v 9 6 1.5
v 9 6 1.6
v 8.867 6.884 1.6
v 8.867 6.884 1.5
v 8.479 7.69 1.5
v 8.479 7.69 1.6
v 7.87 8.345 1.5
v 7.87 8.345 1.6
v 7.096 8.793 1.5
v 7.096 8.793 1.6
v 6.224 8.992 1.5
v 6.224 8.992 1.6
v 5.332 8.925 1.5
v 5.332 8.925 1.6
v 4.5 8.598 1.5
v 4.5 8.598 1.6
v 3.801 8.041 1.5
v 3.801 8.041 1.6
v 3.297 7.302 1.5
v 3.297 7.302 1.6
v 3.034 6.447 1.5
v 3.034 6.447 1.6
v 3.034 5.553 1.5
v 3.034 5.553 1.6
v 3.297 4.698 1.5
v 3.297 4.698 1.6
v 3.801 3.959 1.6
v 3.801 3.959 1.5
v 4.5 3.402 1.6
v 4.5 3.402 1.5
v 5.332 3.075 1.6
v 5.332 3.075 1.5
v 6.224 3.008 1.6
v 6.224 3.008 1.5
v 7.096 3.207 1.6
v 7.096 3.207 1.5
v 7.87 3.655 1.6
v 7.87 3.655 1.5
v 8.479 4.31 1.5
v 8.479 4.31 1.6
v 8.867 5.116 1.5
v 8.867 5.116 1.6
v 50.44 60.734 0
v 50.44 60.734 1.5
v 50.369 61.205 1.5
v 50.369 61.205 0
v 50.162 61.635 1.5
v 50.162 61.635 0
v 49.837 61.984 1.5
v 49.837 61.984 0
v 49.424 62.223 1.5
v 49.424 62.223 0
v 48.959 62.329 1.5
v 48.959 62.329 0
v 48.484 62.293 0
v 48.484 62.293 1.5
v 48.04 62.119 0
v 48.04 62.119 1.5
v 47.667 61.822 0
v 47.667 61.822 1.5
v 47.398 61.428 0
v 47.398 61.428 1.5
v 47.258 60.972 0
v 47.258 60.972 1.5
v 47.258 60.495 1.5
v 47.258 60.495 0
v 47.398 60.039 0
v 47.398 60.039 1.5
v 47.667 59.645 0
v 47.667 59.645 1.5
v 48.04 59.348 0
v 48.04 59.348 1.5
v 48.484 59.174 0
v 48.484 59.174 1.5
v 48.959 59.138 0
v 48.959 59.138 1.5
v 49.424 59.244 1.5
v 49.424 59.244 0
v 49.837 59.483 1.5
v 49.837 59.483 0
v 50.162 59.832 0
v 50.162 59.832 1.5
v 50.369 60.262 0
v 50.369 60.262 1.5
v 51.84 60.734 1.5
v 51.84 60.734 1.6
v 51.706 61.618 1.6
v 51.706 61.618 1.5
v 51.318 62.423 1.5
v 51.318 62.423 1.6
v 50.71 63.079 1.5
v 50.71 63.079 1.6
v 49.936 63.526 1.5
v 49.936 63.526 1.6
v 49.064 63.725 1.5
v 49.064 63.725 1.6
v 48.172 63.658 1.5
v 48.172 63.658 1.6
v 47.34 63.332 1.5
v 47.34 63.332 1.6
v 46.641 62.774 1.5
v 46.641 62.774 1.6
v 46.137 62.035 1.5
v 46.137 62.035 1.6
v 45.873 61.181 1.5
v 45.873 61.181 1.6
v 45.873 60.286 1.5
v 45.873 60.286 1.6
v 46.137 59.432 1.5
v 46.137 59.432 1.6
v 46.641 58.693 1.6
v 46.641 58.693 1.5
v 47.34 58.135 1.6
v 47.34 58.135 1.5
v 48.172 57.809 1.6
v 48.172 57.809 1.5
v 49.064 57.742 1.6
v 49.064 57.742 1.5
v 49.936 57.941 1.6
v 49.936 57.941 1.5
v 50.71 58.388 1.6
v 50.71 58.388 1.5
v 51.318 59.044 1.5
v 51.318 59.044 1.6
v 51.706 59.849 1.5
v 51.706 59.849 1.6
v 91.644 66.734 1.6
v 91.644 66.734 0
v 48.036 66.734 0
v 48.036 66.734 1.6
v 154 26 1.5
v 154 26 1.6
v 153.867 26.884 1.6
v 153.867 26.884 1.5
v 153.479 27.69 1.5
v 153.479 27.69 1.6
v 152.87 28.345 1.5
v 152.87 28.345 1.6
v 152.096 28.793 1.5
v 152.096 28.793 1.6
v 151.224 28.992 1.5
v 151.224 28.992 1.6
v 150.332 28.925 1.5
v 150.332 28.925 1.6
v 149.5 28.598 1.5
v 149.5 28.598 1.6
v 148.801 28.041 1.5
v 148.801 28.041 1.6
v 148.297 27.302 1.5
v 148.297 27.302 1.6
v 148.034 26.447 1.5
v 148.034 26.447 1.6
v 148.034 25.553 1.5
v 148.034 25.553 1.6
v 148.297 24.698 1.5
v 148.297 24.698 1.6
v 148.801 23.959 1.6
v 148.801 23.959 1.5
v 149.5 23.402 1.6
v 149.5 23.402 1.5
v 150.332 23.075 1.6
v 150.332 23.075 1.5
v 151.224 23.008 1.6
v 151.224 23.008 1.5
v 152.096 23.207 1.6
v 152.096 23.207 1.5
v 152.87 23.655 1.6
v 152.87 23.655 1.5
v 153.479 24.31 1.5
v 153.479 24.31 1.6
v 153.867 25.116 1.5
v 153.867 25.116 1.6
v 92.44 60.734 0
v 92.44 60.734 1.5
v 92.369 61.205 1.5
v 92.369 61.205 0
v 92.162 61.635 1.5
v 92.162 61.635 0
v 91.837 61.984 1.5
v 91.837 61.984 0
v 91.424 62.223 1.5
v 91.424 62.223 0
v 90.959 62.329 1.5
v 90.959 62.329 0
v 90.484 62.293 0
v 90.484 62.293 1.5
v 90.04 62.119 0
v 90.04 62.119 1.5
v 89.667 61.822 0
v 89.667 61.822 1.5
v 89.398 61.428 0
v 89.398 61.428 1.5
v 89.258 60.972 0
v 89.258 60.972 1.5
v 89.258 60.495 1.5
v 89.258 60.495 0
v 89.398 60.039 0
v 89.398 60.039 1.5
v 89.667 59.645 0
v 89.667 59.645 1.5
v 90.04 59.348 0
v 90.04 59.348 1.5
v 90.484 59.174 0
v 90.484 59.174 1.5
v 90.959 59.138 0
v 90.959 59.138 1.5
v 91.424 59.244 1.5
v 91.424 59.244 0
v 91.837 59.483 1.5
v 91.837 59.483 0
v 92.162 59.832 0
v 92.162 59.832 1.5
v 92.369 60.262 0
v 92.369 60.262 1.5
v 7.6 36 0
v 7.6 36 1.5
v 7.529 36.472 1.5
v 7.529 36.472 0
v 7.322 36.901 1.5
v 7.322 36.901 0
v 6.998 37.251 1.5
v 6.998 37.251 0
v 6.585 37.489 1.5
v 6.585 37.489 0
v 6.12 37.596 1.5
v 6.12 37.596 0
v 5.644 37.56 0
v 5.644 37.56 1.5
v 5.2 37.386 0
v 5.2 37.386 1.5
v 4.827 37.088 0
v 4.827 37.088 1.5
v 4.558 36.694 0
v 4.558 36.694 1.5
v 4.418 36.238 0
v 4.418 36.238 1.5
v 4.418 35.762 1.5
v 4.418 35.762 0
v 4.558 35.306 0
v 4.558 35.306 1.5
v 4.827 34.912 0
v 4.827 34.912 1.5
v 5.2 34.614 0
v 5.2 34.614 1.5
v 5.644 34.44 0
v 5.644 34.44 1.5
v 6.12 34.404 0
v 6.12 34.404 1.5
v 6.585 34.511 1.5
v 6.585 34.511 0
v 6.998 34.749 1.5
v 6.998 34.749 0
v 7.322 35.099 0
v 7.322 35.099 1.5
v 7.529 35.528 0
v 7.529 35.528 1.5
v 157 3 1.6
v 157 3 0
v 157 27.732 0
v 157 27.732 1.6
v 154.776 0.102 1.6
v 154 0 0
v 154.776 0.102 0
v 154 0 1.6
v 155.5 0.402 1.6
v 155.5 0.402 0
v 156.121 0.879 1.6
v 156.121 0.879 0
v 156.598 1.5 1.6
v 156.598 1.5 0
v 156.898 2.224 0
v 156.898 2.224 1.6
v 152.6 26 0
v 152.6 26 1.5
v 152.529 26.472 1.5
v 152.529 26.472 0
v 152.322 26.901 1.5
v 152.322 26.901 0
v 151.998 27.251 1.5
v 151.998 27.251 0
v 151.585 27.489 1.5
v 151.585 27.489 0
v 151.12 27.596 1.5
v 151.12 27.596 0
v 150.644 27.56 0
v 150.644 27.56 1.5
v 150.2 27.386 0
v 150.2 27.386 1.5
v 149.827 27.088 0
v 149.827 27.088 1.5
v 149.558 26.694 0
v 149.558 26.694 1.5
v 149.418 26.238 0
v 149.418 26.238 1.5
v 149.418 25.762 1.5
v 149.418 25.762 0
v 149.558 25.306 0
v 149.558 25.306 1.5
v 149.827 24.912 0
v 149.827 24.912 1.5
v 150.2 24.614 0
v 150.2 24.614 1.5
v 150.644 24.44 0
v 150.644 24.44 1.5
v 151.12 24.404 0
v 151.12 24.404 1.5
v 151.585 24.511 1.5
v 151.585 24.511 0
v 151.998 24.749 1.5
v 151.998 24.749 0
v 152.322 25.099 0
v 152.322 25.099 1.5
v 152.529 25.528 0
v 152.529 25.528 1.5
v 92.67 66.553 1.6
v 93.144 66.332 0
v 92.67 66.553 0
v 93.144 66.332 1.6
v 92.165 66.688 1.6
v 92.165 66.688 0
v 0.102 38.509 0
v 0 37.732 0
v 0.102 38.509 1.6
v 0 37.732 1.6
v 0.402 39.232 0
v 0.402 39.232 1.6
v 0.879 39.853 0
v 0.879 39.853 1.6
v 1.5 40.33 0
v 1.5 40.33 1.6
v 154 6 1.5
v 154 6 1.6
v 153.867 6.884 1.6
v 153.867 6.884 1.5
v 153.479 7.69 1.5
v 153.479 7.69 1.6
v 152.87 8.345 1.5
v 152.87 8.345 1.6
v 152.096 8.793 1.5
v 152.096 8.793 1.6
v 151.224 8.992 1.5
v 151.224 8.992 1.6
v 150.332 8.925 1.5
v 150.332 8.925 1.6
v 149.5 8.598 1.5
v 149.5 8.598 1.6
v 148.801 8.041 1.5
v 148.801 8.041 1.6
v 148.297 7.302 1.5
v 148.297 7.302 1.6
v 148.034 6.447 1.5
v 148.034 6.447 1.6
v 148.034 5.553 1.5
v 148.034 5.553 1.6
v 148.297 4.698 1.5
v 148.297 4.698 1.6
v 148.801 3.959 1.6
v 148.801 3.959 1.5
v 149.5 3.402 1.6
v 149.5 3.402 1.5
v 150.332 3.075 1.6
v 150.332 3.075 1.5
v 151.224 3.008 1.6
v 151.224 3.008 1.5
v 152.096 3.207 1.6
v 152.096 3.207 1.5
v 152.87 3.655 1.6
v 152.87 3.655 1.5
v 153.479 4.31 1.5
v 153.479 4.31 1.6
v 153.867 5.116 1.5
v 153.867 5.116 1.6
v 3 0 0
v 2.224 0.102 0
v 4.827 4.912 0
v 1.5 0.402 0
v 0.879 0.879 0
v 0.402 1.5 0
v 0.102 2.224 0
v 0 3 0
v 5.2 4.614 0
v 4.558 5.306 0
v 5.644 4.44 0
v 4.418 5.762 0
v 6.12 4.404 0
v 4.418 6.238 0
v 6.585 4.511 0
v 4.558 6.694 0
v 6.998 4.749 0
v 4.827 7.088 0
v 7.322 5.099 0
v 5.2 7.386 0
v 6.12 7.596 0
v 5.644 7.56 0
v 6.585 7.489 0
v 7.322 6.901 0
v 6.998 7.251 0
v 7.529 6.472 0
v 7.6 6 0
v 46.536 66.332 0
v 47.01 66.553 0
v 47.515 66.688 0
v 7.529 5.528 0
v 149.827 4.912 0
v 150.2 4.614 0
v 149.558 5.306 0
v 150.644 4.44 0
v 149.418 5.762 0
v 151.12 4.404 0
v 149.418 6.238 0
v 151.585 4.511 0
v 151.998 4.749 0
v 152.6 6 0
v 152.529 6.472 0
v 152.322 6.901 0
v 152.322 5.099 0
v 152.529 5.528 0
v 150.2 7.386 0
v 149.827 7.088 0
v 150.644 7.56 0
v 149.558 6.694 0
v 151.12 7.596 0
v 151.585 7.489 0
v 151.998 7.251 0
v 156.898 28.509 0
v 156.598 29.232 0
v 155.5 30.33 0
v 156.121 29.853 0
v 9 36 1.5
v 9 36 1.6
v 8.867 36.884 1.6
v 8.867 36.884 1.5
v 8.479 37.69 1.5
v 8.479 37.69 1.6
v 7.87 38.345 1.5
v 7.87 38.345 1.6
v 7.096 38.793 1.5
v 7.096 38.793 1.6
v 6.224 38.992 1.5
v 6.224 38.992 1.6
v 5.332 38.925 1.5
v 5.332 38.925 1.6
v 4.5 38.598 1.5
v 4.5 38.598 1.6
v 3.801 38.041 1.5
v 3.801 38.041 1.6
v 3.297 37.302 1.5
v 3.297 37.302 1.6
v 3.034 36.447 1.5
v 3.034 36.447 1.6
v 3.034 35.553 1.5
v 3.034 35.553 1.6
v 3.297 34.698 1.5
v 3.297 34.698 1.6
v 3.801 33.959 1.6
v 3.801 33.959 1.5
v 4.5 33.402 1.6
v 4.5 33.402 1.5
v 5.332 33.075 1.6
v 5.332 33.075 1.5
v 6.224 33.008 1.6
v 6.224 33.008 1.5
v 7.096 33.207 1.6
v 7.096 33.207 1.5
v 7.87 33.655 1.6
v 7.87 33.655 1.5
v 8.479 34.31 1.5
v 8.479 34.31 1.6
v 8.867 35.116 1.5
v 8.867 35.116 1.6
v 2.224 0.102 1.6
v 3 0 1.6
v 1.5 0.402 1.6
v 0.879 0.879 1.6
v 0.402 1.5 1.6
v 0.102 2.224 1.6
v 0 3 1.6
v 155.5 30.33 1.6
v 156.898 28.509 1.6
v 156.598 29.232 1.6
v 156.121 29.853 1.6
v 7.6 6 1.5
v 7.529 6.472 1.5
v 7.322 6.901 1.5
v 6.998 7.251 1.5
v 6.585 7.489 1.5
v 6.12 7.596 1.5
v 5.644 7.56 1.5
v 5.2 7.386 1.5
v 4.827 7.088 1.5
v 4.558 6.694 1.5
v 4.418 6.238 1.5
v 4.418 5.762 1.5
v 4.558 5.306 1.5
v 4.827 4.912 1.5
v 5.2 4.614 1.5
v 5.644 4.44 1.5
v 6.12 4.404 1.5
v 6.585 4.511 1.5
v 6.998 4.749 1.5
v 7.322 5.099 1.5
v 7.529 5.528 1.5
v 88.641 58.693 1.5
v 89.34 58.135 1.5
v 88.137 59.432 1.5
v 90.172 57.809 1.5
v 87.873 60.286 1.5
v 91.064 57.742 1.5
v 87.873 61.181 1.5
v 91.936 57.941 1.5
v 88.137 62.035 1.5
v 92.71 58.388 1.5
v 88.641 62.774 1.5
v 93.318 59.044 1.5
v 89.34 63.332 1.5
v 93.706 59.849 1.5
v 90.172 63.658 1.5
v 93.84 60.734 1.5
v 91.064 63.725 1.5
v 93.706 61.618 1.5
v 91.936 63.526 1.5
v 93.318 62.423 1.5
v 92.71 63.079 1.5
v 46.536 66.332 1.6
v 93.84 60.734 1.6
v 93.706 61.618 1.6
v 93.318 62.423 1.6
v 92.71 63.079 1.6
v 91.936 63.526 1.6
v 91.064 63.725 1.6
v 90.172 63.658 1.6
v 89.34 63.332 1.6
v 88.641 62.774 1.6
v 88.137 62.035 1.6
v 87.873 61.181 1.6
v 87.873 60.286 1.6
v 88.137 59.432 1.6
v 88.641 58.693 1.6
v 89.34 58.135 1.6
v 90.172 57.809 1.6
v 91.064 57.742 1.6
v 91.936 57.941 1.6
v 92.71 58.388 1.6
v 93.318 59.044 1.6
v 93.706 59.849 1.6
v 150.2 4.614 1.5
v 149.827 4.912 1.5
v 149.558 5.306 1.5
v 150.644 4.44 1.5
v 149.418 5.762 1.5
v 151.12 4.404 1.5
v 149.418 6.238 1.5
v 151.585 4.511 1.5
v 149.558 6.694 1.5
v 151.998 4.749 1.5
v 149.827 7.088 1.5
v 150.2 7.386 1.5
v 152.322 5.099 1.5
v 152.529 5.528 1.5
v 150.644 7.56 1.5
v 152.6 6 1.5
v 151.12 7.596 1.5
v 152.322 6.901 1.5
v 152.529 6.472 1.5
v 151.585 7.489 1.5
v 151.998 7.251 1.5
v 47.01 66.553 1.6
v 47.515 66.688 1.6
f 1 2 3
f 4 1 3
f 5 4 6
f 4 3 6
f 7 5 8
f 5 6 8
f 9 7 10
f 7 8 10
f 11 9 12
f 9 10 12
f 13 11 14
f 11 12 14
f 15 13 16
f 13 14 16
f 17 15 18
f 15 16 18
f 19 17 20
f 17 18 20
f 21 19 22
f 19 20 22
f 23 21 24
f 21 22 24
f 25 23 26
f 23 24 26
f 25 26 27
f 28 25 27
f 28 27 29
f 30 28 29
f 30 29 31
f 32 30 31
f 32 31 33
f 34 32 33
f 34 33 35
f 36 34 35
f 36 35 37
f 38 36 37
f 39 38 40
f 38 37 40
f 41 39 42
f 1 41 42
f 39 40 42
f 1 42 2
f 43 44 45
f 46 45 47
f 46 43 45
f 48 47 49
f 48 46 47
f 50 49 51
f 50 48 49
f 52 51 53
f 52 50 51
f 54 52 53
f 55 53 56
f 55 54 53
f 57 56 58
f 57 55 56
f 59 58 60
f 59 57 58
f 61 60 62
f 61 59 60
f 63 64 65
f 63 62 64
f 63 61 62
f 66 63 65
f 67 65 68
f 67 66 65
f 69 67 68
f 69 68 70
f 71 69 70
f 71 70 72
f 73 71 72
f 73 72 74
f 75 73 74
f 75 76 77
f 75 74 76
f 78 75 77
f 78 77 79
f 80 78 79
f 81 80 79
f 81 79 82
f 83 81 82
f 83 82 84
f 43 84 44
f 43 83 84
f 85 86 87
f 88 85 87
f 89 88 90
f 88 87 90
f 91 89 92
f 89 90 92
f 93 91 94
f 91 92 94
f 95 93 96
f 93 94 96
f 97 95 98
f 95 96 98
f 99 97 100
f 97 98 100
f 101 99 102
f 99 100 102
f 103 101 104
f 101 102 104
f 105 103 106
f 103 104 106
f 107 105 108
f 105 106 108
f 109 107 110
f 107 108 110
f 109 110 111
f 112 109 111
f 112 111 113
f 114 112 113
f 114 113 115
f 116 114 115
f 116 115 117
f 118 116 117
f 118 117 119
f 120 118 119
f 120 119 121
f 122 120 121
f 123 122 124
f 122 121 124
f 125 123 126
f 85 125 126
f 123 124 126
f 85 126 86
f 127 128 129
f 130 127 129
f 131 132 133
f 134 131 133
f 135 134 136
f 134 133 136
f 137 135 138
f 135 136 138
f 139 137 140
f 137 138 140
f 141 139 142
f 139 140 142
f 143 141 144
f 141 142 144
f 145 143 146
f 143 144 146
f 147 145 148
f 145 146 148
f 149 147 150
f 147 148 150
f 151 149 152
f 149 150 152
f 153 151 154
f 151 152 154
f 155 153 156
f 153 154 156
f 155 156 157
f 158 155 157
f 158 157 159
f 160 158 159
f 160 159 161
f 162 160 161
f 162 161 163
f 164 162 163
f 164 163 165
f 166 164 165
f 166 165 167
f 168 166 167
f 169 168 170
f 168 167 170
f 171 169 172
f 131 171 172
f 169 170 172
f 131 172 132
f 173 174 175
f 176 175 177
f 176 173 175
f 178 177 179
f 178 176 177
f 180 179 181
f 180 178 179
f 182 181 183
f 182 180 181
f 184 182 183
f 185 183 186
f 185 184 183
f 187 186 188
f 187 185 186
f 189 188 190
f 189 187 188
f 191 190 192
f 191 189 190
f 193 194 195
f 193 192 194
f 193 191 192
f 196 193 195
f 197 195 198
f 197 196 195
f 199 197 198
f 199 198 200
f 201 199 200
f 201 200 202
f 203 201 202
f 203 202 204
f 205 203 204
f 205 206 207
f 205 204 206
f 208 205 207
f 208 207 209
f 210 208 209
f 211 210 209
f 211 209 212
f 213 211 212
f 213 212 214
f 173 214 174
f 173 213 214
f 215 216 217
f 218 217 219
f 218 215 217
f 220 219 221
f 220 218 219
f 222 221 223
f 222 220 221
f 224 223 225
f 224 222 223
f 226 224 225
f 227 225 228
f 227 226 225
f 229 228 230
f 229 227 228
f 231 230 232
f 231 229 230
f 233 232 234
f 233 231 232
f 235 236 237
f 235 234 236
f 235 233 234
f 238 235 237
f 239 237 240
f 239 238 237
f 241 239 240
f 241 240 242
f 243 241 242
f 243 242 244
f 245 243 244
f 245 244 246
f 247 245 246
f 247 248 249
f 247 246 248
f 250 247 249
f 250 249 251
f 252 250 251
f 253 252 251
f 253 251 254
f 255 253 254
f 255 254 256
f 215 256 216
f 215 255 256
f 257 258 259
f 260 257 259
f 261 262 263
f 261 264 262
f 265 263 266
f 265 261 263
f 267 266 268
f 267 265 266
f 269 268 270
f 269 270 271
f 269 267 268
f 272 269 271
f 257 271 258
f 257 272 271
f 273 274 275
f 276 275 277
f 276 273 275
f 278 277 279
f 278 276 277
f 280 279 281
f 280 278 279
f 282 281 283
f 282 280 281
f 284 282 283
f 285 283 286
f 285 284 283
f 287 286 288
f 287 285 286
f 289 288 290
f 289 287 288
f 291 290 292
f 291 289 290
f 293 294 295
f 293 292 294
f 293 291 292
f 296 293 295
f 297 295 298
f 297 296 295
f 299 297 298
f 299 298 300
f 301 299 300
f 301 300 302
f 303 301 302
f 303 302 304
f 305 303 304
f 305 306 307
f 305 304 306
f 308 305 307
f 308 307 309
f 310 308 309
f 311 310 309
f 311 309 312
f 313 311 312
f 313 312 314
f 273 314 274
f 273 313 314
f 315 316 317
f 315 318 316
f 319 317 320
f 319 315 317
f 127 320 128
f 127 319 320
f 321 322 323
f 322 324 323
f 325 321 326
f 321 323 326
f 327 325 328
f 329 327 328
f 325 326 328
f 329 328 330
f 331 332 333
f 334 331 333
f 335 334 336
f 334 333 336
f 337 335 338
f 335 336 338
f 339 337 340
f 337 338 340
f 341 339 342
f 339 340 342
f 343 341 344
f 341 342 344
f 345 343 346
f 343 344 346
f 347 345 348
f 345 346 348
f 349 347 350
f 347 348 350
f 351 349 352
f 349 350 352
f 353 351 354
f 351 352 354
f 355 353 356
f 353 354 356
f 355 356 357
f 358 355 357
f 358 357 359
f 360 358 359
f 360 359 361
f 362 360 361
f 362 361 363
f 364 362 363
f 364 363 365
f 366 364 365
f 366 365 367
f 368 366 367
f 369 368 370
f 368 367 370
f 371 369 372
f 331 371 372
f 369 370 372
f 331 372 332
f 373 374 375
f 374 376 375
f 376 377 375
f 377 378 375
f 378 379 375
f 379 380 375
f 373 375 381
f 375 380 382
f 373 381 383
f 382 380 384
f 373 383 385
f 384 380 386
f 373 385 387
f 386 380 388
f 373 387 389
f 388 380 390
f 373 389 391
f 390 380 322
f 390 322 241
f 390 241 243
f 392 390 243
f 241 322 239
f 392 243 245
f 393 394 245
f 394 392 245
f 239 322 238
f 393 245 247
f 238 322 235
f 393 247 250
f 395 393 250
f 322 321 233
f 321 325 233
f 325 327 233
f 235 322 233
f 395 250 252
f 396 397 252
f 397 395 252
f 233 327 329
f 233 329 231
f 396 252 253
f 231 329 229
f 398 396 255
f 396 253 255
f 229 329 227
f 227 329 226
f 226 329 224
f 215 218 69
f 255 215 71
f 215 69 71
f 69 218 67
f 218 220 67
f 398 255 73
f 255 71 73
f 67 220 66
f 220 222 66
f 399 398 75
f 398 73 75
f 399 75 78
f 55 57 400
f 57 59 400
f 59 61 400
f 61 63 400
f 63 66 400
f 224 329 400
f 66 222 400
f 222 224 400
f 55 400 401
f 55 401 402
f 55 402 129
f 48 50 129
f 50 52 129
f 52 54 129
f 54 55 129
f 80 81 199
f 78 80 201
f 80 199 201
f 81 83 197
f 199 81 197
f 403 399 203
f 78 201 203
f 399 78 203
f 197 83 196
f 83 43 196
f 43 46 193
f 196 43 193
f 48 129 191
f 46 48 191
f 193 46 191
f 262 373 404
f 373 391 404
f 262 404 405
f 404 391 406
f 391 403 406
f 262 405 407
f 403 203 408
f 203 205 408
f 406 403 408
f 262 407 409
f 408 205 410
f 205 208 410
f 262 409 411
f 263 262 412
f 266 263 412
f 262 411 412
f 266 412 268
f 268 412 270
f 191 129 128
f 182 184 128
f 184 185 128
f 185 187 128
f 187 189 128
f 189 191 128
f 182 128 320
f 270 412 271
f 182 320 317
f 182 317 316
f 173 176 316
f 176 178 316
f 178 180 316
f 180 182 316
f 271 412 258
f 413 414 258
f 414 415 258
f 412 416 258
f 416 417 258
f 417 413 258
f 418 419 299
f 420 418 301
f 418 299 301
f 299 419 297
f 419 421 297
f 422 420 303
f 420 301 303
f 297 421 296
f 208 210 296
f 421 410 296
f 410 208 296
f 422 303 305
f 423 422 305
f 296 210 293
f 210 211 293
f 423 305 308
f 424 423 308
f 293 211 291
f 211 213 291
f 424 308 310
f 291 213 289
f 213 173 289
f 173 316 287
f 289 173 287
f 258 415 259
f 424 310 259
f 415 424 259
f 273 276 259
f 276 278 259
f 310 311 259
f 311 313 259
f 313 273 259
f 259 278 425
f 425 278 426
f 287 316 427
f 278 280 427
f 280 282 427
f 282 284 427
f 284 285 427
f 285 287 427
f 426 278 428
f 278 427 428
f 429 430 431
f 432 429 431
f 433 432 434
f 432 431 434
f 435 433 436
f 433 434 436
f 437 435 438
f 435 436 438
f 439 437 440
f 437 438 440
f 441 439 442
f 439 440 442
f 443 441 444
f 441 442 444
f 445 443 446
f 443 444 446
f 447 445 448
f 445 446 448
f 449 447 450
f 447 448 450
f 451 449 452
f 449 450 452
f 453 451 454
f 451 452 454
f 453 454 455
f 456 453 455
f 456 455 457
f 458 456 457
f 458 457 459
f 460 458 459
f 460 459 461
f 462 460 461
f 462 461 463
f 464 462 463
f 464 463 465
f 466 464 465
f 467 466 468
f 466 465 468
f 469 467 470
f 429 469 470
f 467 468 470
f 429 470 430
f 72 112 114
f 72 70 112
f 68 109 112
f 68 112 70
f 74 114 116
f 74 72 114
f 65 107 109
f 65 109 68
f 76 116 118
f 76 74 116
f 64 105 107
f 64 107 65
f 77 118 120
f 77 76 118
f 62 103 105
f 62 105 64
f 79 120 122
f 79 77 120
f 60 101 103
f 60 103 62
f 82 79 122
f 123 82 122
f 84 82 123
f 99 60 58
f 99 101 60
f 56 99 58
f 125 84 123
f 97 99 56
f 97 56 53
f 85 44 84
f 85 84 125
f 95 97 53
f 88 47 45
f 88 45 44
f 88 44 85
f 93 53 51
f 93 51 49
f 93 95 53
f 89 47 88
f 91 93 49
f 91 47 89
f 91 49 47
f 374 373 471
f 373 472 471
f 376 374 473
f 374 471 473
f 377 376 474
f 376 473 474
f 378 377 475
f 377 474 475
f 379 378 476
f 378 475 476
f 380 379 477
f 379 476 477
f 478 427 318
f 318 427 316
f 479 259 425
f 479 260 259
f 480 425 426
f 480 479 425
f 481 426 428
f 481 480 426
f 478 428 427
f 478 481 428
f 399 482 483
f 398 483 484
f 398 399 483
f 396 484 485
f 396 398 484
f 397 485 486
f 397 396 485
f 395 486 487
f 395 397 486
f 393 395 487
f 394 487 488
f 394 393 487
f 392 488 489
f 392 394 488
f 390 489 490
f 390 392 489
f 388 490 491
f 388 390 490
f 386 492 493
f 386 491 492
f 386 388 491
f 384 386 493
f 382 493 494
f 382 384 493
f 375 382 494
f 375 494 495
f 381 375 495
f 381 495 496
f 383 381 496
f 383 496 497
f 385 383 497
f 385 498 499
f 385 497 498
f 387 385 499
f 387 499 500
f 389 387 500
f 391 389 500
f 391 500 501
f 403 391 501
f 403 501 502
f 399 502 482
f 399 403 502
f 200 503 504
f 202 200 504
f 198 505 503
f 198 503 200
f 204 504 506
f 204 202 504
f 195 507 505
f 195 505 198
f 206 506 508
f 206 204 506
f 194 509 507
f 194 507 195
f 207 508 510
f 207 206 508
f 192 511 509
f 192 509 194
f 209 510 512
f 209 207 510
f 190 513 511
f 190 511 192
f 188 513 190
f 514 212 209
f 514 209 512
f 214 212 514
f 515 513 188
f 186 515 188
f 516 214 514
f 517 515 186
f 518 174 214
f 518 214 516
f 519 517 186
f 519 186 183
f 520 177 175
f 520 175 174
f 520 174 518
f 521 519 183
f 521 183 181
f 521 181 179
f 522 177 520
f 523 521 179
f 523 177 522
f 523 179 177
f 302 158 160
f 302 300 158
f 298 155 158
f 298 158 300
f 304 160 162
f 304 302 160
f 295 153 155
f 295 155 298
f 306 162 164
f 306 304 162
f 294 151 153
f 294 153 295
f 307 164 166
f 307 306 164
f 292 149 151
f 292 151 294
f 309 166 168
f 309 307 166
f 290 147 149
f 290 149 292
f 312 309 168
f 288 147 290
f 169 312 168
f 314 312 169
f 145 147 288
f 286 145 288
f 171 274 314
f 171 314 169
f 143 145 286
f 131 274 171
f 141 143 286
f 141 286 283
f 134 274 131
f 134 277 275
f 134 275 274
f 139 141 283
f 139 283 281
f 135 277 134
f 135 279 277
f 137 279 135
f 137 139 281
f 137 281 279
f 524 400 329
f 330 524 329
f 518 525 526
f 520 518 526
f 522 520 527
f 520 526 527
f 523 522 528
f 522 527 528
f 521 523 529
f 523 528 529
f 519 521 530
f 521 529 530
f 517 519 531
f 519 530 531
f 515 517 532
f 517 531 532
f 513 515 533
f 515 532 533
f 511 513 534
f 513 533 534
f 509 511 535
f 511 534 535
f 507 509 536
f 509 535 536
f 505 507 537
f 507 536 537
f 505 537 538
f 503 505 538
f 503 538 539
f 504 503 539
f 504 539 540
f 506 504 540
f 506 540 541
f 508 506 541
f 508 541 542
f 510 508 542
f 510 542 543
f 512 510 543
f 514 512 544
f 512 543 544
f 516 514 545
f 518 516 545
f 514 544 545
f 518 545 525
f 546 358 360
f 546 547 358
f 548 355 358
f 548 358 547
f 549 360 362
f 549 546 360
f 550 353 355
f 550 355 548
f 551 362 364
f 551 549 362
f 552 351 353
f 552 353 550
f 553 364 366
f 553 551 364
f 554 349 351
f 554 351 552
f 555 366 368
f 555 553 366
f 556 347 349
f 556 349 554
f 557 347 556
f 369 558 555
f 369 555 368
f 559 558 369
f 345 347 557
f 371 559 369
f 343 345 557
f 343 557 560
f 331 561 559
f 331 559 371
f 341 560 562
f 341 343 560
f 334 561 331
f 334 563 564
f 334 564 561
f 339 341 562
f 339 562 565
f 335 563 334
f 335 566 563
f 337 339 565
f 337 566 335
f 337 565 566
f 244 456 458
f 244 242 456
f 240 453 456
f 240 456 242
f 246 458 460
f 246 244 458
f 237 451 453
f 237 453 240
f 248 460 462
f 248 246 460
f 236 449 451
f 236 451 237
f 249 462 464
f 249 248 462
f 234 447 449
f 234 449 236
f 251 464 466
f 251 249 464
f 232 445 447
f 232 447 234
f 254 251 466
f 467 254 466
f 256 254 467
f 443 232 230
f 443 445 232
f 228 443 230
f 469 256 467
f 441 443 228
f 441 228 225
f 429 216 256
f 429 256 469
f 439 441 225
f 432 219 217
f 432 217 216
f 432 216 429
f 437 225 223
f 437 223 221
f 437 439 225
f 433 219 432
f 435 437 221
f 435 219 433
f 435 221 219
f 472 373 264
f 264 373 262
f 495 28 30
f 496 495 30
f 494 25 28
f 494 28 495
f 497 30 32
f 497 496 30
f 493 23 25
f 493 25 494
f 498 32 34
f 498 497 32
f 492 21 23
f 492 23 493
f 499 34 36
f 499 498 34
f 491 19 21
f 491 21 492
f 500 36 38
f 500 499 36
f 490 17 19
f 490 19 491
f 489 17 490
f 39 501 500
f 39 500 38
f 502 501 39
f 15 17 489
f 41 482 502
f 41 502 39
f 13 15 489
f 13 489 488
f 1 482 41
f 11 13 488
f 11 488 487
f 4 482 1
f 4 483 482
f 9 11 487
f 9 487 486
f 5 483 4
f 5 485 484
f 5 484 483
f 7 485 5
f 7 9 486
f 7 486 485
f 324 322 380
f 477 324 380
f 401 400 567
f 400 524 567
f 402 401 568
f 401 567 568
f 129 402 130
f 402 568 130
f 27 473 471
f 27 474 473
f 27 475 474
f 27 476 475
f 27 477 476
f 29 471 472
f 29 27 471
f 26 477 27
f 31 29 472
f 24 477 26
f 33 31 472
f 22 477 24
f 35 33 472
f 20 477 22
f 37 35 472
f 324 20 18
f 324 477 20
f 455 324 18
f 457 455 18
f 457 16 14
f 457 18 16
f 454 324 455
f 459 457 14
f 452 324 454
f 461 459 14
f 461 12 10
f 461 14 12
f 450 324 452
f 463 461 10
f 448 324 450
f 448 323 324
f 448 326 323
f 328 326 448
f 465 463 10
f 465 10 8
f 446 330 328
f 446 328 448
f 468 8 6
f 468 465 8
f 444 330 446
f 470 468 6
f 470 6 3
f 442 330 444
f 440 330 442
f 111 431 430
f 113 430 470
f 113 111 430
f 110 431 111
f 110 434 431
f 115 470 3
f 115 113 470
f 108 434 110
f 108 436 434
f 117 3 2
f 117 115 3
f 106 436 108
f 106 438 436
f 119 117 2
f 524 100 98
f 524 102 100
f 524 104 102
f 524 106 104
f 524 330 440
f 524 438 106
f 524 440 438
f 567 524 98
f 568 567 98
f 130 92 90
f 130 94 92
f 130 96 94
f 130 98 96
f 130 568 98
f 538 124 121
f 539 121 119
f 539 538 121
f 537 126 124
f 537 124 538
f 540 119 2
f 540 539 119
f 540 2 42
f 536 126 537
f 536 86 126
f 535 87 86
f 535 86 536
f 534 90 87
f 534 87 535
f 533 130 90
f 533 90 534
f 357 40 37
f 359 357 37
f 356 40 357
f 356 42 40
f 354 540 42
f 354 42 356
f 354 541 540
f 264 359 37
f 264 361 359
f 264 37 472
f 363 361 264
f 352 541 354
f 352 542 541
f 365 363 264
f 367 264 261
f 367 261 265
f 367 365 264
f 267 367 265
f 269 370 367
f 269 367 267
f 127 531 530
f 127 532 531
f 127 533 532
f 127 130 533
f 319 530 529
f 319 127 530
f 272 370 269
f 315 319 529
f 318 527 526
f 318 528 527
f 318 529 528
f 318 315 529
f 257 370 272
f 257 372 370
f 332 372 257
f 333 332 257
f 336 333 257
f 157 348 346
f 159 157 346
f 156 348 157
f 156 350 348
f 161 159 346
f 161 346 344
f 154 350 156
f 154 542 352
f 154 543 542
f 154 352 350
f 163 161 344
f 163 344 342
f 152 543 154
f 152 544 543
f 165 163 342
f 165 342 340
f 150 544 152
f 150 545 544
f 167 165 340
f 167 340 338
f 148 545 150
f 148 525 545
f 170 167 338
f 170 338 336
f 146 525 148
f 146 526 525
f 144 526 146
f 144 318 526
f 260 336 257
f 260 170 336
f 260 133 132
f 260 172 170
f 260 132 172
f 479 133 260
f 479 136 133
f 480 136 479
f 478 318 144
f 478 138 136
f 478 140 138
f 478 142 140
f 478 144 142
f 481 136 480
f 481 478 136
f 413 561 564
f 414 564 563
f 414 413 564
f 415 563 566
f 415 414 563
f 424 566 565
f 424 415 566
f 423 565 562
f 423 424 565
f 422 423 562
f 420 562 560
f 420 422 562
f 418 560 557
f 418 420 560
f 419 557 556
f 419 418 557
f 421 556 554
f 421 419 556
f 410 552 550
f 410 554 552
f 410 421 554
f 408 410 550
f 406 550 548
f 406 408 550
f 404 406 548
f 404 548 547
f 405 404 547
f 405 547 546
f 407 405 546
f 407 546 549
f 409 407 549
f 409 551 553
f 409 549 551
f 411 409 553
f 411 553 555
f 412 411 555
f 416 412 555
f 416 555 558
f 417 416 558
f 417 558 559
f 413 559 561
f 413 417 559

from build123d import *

# Parameters (mm, degrees)
SKETCH1_R           = 1.6
BOSS_EXTRUDE1_DEPTH = 1.6
FILLET1_R           = 3
SKETCH2_R           = 3
CUT_EXTRUDE1_DEPTH  = 0.1


with BuildPart() as part:
    # Sketch1 → Boss-Extrude1 (new body)
    with BuildSketch(Plane.XY):
        Polygon((0, 0), (157, 0), (157, 29.464101615), (92.447441117, 66.733538863), (47.232050808, 66.733538863), (0, 39.464101615), align=None)
        with Locations((6, 36)):
            Circle(SKETCH1_R, mode=Mode.SUBTRACT)
        with Locations((6, 6)):
            Circle(SKETCH1_R, mode=Mode.SUBTRACT)
        with Locations((151, 6)):
            Circle(SKETCH1_R, mode=Mode.SUBTRACT)
        with Locations((151, 26)):
            Circle(SKETCH1_R, mode=Mode.SUBTRACT)
        with Locations((90.839745962, 60.733538863)):
            Circle(SKETCH1_R, mode=Mode.SUBTRACT)
        with Locations((48.839745962, 60.733538863)):
            Circle(SKETCH1_R, mode=Mode.SUBTRACT)
    extrude(amount=BOSS_EXTRUDE1_DEPTH)

    # Fillet1
    fillet1_edges = [part.edges().sort_by_distance(p)[0] for p in [
        (0, 39.464101615, 0.8),
        (47.232050808, 66.733538863, 0.8),
        (92.447441117, 66.733538863, 0.8),
        (157, 29.464101615, 0.8),
        (157, 0, 0.8),
        (0, 0, 0.8),
    ]]
    fillet(fillet1_edges, radius=FILLET1_R)

    # Sketch2 → Cut-Extrude1 (cut)
    with BuildSketch(Plane.XY.offset(1.6)):
        with Locations((6, 6)):
            Circle(SKETCH2_R)
        with Locations((6, 36)):
            Circle(SKETCH2_R)
        with Locations((48.839745962, 60.733538863)):
            Circle(SKETCH2_R)
        with Locations((90.839745962, 60.733538863)):
            Circle(SKETCH2_R)
        with Locations((151, 26)):
            Circle(SKETCH2_R)
        with Locations((151, 6)):
            Circle(SKETCH2_R)
    extrude(amount=-CUT_EXTRUDE1_DEPTH, mode=Mode.SUBTRACT)


solid = part.part
